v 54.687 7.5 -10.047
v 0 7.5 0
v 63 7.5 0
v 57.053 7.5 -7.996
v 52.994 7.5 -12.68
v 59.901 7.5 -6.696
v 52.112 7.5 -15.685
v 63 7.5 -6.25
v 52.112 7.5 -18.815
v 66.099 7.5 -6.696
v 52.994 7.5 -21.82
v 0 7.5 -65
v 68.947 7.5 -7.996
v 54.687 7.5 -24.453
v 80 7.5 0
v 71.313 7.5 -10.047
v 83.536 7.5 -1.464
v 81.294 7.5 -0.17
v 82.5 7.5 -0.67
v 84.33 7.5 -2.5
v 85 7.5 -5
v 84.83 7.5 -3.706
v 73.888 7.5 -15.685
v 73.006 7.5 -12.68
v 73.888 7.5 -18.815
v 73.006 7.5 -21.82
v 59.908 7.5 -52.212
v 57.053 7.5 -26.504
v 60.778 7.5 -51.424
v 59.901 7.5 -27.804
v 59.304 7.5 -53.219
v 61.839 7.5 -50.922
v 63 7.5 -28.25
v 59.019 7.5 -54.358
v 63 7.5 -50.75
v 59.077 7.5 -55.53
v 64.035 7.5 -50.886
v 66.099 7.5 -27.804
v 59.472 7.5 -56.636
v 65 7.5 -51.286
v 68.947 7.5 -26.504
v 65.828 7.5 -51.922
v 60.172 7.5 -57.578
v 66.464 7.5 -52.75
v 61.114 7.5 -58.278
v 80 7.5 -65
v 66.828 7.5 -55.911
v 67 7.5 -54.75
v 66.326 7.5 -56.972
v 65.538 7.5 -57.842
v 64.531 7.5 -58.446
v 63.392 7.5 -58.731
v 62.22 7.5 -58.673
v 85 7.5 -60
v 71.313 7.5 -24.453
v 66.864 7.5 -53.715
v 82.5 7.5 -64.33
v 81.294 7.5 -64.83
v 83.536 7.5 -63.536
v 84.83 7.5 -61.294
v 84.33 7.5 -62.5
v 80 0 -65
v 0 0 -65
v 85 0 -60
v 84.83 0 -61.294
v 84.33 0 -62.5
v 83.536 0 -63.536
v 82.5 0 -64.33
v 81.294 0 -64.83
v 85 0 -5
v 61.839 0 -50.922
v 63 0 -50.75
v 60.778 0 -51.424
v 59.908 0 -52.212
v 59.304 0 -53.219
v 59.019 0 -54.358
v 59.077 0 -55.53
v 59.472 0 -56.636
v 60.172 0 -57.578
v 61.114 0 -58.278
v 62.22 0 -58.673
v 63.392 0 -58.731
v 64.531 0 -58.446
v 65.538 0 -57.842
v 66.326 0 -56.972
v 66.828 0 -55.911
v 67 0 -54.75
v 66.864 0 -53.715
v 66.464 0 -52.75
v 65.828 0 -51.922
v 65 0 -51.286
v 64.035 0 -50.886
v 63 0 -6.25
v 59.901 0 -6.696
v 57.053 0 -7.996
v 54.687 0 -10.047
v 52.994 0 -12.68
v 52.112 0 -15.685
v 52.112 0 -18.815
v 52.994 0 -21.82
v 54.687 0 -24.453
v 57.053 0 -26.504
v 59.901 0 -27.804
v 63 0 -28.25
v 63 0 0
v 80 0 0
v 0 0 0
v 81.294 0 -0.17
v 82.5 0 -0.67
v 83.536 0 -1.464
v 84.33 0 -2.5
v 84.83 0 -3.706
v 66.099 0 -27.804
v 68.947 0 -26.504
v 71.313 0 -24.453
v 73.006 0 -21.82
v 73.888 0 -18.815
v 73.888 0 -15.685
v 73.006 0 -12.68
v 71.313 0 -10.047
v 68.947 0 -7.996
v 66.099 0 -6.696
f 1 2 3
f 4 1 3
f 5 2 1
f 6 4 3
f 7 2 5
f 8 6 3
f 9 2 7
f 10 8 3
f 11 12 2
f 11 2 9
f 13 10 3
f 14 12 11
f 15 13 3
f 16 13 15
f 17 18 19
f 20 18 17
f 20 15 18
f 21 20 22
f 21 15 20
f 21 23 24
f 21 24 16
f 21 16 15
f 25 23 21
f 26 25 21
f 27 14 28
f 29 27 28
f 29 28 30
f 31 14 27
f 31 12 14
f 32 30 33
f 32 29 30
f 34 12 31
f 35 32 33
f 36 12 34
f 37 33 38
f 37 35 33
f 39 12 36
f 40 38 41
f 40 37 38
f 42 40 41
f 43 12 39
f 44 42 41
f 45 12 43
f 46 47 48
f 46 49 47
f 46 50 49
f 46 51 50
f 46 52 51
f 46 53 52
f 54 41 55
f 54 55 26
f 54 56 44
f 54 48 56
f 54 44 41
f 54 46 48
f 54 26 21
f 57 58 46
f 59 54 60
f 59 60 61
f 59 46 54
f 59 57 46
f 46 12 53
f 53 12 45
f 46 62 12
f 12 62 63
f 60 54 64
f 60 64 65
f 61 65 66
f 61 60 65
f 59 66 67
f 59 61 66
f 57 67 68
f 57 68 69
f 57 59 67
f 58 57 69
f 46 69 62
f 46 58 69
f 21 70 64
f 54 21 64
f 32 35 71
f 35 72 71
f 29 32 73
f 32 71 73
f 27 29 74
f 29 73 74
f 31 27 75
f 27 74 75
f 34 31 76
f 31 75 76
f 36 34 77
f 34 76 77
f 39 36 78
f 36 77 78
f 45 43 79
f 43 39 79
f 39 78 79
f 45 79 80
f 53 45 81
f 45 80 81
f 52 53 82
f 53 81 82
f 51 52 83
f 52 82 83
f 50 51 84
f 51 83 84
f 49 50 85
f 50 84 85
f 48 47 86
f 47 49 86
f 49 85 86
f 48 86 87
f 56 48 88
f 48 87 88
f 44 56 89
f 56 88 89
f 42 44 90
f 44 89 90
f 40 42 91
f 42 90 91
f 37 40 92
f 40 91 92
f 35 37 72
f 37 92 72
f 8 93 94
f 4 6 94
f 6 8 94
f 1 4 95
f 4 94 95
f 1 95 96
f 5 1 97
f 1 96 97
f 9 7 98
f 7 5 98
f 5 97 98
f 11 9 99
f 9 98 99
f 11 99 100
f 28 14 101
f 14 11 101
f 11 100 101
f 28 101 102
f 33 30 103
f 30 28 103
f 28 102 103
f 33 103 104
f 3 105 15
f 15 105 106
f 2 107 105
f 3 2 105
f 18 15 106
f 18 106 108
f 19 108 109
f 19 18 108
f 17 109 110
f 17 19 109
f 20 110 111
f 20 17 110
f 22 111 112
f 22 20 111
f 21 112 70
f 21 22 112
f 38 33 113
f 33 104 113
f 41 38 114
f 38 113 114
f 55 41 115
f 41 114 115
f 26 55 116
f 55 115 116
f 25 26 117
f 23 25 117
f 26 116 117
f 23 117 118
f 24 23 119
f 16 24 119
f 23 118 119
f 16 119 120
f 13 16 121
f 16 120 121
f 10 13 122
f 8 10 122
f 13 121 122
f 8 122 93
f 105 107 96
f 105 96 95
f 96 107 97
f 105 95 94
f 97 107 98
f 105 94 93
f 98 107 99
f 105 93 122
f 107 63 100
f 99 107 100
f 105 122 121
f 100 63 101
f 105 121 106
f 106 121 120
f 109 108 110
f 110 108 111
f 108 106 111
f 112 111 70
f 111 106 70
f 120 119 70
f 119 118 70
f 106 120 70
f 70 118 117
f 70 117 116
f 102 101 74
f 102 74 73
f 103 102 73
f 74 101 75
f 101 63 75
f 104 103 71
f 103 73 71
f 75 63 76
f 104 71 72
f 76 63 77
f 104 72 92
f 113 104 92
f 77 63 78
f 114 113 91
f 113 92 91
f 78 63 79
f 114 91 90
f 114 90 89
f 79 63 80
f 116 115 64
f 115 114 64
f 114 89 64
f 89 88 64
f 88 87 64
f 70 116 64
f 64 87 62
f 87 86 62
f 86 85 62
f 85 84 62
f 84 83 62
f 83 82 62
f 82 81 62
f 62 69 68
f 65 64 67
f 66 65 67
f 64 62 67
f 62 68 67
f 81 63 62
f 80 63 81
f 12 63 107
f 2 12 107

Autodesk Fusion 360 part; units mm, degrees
sketch "Sketch1" plane through (0, 0, 0) normal (0, 1, 0) x (1, 0, 0)
  line L0 (0, 0) -> (85, 0)
  line L1 (85, 0) -> (85, 65)
  line L2 (85, 65) -> (0, 65)
  line L3 (0, 65) -> (0, 0)
  line L4 (0, 17.25) -> (63, 17.25) construction
  line L5 (63, 17.25) -> (63, 0) construction
  line L6 (63, 17.25) -> (63, 65) construction
  line L7 (63, 17.25) -> (63, 54.75)
  circle A0 centre (63, 17.25) radius 11
  circle A1 centre (63, 54.75) radius 4
  line L8 (63, 6.25) -> (63, 0)
  dimension "d1" = 85
  dimension "d2" = 65
  dimension "d4" = 63
  dimension "d5" = 37.5
  dimension "d6" = 22
  dimension "d7" = 8
  dimension "d9" = 6.25
extrude "Extrude1" add sketch "Sketch1" along normal blind 7.5
fillet "Fillet1" radius 5 1 edges at (85, 3.75, 0)
fillet "Fillet2" radius 5 1 edges at (85, 3.75, -65)
